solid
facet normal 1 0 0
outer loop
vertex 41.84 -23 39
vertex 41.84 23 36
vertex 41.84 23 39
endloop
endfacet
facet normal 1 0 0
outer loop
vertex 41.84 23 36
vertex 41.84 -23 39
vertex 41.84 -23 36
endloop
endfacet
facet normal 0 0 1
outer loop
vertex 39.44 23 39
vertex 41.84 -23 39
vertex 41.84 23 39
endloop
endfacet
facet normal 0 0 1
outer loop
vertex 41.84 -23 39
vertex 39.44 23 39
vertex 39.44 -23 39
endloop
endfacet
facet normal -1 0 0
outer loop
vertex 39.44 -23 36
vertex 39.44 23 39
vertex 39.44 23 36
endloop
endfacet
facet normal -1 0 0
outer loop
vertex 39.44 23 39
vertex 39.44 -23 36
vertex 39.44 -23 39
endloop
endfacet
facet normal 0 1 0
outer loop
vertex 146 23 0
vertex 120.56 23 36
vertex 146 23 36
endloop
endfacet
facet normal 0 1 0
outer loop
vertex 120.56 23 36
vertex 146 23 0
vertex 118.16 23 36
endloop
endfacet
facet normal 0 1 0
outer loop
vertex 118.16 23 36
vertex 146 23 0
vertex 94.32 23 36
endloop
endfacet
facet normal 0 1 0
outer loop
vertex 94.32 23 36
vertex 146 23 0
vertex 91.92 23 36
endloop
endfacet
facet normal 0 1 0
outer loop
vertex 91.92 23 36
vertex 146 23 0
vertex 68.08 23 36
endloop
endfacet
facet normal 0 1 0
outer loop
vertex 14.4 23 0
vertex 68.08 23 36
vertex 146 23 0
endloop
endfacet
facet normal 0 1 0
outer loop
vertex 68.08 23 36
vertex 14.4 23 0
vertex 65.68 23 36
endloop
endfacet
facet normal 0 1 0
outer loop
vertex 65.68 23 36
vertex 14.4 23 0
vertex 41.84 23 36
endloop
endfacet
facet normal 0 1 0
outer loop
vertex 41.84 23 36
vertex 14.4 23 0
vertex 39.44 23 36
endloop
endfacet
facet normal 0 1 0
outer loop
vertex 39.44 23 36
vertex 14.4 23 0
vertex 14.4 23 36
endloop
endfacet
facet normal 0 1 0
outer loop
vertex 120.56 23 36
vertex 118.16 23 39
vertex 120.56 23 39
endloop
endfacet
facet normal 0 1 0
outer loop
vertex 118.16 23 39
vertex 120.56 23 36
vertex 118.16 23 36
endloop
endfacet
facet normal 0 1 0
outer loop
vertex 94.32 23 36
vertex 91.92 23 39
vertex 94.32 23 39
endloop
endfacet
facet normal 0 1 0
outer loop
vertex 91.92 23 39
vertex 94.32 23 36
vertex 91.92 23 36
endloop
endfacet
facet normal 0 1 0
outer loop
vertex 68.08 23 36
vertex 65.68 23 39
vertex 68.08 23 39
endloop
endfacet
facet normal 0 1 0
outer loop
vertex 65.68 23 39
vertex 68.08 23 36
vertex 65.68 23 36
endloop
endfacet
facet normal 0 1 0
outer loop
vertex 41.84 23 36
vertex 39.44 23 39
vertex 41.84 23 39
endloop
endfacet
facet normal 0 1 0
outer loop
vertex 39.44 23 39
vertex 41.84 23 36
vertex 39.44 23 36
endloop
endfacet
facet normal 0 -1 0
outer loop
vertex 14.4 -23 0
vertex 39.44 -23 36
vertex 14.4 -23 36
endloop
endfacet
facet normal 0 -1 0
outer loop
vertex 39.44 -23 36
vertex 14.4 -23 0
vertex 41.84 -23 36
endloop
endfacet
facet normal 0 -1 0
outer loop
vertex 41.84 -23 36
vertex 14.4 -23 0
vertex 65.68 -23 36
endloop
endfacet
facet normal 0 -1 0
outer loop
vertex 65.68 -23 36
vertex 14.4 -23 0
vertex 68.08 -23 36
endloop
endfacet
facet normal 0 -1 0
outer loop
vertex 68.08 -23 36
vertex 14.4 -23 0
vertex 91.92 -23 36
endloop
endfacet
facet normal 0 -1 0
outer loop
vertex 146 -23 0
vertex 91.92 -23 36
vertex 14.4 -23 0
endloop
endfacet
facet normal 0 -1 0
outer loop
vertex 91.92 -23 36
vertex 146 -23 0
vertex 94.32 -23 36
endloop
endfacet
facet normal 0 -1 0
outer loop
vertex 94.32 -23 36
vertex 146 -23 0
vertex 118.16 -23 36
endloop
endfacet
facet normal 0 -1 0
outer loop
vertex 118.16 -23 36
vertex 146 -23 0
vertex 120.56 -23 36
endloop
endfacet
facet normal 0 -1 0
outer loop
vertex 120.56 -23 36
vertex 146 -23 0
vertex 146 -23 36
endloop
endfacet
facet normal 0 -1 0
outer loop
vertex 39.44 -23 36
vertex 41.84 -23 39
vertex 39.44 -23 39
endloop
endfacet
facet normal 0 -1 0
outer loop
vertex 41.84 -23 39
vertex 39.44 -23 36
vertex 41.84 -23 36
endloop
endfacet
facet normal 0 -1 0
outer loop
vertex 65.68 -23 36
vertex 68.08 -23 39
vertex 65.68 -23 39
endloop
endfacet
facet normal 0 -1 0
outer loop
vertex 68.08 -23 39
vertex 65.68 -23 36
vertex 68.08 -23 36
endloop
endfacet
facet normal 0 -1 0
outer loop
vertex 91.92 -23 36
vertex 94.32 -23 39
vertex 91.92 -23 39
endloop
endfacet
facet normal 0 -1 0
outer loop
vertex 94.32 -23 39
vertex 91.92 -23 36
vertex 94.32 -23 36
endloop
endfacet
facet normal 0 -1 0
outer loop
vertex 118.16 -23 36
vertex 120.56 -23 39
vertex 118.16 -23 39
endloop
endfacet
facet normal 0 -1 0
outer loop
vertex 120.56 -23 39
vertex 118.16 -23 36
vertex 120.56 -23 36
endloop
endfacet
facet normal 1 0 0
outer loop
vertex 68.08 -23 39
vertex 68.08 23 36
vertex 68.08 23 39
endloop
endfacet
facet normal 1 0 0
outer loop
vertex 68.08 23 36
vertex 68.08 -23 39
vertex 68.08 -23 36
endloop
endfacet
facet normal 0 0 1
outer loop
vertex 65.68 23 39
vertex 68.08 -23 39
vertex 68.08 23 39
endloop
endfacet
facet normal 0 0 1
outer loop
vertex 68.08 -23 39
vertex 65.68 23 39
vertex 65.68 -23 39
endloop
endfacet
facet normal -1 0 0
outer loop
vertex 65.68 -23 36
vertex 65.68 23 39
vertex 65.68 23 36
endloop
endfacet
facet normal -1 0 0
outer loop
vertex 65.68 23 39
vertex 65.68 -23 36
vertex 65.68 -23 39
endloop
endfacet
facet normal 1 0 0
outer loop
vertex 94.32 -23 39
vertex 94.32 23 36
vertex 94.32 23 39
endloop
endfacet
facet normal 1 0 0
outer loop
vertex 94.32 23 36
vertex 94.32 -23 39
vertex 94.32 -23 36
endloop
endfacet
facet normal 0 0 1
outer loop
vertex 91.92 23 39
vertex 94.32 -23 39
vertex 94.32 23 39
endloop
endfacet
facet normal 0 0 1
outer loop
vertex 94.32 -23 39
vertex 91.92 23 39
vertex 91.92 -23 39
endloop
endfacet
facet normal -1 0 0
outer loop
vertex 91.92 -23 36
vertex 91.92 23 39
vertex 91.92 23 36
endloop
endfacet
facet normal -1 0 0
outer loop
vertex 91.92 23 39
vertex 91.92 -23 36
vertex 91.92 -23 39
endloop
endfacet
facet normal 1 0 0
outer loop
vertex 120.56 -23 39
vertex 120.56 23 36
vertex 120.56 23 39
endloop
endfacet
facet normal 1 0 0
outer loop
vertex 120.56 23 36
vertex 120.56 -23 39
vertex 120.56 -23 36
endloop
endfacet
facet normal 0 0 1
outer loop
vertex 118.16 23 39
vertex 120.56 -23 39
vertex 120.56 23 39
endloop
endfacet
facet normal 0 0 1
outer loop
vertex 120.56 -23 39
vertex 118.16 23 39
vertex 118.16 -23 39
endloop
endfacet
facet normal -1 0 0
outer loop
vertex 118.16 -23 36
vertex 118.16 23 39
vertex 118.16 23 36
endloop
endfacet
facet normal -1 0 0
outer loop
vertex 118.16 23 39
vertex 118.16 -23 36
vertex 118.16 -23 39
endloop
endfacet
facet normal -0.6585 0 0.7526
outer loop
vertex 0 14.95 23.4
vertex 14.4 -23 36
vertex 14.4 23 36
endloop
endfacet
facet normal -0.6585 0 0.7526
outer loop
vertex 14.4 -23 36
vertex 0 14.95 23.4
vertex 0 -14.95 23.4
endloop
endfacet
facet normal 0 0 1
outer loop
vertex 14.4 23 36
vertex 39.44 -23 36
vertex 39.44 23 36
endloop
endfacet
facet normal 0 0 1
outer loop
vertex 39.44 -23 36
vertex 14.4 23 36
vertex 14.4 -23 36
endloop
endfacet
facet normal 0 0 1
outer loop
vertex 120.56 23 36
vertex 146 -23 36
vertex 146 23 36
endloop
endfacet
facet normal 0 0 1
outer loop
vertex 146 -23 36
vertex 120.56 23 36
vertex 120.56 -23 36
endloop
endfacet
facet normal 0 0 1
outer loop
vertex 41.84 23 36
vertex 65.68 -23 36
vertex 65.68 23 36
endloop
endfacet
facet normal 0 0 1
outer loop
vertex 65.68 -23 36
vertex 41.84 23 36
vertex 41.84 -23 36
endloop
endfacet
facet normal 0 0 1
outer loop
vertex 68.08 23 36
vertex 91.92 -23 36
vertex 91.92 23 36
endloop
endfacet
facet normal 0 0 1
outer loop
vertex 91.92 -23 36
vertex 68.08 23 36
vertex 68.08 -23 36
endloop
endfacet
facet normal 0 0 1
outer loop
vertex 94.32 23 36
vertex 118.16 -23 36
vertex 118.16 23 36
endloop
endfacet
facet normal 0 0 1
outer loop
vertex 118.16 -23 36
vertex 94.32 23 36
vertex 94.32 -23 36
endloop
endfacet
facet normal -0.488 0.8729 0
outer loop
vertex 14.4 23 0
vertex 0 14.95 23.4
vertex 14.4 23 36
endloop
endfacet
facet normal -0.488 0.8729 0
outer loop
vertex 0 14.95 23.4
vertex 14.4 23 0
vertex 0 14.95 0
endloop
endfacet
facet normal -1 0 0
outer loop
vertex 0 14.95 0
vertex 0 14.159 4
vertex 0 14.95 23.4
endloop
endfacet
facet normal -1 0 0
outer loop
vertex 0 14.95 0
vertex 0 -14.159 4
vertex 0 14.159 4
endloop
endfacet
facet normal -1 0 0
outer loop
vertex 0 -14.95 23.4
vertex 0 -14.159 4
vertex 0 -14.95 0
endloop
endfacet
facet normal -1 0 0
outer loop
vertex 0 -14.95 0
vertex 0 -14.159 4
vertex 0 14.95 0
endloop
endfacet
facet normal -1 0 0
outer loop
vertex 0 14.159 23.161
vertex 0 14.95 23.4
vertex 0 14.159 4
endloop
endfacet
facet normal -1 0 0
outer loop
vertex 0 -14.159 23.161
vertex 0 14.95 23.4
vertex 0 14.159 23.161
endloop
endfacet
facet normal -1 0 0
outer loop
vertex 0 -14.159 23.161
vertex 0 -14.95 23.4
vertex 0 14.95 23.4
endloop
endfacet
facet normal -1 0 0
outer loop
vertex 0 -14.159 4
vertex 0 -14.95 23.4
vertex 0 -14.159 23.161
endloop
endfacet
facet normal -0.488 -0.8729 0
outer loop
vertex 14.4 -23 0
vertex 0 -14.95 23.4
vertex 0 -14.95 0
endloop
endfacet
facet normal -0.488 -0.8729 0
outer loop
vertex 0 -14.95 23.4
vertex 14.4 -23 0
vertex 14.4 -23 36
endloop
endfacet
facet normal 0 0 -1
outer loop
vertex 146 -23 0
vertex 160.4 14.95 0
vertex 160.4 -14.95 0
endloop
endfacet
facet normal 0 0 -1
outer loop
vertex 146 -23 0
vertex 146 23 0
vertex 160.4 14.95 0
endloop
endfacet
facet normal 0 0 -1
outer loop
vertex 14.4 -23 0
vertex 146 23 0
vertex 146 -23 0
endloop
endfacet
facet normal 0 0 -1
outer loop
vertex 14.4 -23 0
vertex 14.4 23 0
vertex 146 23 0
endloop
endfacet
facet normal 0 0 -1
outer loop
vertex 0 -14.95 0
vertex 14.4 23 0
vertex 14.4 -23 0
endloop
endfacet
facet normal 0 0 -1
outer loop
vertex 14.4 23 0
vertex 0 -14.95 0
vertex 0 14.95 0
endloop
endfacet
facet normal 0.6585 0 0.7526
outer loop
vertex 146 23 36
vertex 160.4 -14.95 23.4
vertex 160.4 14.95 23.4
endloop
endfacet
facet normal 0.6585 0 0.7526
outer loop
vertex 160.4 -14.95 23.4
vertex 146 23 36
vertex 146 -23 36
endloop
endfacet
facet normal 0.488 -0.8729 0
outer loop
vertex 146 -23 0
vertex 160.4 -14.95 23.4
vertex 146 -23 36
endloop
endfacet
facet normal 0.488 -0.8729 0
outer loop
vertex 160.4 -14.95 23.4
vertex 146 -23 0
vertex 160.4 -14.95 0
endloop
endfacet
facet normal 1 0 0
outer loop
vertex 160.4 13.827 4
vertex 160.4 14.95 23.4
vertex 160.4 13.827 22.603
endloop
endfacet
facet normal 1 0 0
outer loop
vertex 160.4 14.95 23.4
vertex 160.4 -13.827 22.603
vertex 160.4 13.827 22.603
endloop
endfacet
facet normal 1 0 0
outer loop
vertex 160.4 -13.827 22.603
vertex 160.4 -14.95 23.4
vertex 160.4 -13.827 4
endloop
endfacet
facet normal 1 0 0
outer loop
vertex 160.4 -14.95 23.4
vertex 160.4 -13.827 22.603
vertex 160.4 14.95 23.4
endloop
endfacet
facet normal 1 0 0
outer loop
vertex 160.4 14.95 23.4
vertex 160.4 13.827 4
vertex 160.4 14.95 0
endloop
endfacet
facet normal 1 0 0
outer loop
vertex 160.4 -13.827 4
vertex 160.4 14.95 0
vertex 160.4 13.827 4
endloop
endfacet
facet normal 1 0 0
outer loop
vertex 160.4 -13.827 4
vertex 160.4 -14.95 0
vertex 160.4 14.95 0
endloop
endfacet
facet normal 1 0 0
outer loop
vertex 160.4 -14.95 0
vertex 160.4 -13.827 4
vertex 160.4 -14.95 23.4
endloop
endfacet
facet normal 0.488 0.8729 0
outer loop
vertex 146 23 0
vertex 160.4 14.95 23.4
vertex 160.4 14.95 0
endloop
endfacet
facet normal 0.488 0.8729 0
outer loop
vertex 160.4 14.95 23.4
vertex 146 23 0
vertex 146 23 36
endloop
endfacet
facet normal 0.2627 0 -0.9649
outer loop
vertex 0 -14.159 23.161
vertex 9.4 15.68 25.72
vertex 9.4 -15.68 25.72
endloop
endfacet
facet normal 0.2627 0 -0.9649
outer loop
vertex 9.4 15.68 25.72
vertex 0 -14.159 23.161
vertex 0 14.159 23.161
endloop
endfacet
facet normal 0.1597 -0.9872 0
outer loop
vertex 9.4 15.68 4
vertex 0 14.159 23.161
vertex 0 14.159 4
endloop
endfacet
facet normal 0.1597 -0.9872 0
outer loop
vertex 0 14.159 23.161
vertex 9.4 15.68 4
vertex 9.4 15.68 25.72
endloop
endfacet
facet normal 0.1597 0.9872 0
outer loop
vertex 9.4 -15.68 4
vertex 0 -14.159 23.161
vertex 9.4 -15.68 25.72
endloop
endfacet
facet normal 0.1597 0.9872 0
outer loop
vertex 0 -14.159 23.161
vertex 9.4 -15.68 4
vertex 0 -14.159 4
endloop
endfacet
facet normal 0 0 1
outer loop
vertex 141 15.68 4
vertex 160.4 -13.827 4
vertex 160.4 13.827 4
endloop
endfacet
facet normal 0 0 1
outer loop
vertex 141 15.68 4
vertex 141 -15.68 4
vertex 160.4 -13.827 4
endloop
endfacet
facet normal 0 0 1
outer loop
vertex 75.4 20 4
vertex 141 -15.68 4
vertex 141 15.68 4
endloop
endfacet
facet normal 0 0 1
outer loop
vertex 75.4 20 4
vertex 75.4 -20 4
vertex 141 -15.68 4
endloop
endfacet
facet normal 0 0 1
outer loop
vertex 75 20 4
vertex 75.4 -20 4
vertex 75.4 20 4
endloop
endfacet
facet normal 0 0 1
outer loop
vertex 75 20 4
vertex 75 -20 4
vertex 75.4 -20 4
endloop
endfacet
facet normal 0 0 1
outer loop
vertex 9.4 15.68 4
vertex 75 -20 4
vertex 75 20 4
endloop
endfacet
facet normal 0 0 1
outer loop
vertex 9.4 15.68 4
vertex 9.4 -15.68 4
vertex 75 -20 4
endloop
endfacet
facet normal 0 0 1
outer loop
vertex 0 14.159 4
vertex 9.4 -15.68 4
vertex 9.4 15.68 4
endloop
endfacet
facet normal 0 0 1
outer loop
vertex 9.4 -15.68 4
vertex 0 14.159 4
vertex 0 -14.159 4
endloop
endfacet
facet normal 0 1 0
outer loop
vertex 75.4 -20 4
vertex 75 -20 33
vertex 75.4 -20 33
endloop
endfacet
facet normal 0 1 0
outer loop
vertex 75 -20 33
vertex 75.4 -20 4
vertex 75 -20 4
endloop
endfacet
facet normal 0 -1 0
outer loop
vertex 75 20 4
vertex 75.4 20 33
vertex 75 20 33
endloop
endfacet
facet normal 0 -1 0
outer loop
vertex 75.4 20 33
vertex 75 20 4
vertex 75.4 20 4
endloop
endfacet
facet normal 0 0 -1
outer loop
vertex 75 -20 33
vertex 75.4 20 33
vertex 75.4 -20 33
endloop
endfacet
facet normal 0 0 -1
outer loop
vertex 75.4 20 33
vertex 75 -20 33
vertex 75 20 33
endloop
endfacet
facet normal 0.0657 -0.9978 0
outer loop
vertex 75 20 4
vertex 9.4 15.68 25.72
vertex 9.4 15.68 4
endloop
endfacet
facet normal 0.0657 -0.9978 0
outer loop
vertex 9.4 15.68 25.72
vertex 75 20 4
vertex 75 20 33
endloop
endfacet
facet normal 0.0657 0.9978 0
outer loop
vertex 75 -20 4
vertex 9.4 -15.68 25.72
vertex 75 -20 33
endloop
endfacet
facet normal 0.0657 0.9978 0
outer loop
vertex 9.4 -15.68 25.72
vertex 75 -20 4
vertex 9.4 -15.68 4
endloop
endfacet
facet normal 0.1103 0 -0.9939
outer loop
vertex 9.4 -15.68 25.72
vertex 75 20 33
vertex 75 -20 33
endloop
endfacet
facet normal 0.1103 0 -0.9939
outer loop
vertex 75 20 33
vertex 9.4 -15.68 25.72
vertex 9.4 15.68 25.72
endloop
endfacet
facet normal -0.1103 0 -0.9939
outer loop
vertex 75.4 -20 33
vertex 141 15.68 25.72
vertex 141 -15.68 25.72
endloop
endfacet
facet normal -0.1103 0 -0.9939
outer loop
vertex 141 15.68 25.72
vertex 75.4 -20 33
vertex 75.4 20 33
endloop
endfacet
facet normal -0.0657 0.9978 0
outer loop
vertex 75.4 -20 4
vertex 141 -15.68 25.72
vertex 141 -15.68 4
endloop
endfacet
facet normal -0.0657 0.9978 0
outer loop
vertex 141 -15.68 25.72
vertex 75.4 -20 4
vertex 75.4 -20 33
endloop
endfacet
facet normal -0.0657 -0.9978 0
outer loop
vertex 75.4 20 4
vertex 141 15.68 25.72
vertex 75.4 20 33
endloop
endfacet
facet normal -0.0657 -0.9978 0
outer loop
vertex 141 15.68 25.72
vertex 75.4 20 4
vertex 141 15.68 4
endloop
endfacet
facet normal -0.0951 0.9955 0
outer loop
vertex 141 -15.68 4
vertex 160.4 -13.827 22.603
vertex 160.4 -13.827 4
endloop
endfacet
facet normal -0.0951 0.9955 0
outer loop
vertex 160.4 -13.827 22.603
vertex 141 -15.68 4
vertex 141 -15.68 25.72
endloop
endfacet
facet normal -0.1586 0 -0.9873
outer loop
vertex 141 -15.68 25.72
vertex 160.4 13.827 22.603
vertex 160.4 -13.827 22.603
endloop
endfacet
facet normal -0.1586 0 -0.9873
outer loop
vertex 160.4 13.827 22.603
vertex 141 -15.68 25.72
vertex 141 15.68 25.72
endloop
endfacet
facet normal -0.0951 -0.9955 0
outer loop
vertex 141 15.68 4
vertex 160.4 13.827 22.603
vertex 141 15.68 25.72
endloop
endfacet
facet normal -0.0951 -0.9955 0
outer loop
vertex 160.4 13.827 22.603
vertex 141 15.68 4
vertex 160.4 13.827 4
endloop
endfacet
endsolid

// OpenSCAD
$fn = 32;

// ----------------------------------------------------------------------
// Faired channel: 160 x 46 x 36 mm, 3 mm walls, faired ends
// ----------------------------------------------------------------------

// --- parameters (mm) ---
length = 160;             // channel length
width = 46;               // channel width at mid length
height = 36;              // channel height at mid length
wall = 3;                 // side wall thickness
floor_t = 4;              // floor thickness
end_w = 29.9;             // faired end width
end_h = 23.4;             // faired end height
ribs = 4;                 // stiffening ribs on the top
rib_t = 2.4;              // rib thickness
rib_h = 3;                // rib height

difference() {
  union() {
    hull() {
      translate([0, -14.95, 0]) cube([0.4, 29.9, 23.4]);
      translate([14.4, -23, 0]) cube([0.4, 46, 36]);
    }
    hull() {
      translate([14.4, -23, 0]) cube([0.4, 46, 36]);
      translate([80, -23, 0]) cube([0.4, 46, 36]);
    }
    hull() {
      translate([80, -23, 0]) cube([0.4, 46, 36]);
      translate([145.6, -23, 0]) cube([0.4, 46, 36]);
    }
    hull() {
      translate([145.6, -23, 0]) cube([0.4, 46, 36]);
      translate([160, -14.95, 0]) cube([0.4, 29.9, 23.4]);
    }
    /* stiffening ribs across the flat top, sunk 0.8 mm into it */
    for (i = [1 : ribs]) {
      translate([14.4 + i * (length - 2 * 14.4) / (ribs + 1) - rib_t / 2, -width / 2, height - 0.8]) cube([rib_t, width, rib_h + 0.8]);
    }
  }
  /* cavity, 5 mm proud of both ends so the ports are cut clean */
  hull() {
    translate([-5, -13.35, 4]) cube([0.4, 26.7, 17.8]);
    translate([9.4, -15.68, 4]) cube([0.4, 31.36, 21.72]);
  }
  hull() {
    translate([9.4, -15.68, 4]) cube([0.4, 31.36, 21.72]);
    translate([75, -20, 4]) cube([0.4, 40, 29]);
  }
  hull() {
    translate([75, -20, 4]) cube([0.4, 40, 29]);
    translate([140.6, -15.68, 4]) cube([0.4, 31.36, 21.72]);
  }
  hull() {
    translate([140.6, -15.68, 4]) cube([0.4, 31.36, 21.72]);
    translate([165, -13.35, 4]) cube([0.4, 26.7, 17.8]);
  }
}
